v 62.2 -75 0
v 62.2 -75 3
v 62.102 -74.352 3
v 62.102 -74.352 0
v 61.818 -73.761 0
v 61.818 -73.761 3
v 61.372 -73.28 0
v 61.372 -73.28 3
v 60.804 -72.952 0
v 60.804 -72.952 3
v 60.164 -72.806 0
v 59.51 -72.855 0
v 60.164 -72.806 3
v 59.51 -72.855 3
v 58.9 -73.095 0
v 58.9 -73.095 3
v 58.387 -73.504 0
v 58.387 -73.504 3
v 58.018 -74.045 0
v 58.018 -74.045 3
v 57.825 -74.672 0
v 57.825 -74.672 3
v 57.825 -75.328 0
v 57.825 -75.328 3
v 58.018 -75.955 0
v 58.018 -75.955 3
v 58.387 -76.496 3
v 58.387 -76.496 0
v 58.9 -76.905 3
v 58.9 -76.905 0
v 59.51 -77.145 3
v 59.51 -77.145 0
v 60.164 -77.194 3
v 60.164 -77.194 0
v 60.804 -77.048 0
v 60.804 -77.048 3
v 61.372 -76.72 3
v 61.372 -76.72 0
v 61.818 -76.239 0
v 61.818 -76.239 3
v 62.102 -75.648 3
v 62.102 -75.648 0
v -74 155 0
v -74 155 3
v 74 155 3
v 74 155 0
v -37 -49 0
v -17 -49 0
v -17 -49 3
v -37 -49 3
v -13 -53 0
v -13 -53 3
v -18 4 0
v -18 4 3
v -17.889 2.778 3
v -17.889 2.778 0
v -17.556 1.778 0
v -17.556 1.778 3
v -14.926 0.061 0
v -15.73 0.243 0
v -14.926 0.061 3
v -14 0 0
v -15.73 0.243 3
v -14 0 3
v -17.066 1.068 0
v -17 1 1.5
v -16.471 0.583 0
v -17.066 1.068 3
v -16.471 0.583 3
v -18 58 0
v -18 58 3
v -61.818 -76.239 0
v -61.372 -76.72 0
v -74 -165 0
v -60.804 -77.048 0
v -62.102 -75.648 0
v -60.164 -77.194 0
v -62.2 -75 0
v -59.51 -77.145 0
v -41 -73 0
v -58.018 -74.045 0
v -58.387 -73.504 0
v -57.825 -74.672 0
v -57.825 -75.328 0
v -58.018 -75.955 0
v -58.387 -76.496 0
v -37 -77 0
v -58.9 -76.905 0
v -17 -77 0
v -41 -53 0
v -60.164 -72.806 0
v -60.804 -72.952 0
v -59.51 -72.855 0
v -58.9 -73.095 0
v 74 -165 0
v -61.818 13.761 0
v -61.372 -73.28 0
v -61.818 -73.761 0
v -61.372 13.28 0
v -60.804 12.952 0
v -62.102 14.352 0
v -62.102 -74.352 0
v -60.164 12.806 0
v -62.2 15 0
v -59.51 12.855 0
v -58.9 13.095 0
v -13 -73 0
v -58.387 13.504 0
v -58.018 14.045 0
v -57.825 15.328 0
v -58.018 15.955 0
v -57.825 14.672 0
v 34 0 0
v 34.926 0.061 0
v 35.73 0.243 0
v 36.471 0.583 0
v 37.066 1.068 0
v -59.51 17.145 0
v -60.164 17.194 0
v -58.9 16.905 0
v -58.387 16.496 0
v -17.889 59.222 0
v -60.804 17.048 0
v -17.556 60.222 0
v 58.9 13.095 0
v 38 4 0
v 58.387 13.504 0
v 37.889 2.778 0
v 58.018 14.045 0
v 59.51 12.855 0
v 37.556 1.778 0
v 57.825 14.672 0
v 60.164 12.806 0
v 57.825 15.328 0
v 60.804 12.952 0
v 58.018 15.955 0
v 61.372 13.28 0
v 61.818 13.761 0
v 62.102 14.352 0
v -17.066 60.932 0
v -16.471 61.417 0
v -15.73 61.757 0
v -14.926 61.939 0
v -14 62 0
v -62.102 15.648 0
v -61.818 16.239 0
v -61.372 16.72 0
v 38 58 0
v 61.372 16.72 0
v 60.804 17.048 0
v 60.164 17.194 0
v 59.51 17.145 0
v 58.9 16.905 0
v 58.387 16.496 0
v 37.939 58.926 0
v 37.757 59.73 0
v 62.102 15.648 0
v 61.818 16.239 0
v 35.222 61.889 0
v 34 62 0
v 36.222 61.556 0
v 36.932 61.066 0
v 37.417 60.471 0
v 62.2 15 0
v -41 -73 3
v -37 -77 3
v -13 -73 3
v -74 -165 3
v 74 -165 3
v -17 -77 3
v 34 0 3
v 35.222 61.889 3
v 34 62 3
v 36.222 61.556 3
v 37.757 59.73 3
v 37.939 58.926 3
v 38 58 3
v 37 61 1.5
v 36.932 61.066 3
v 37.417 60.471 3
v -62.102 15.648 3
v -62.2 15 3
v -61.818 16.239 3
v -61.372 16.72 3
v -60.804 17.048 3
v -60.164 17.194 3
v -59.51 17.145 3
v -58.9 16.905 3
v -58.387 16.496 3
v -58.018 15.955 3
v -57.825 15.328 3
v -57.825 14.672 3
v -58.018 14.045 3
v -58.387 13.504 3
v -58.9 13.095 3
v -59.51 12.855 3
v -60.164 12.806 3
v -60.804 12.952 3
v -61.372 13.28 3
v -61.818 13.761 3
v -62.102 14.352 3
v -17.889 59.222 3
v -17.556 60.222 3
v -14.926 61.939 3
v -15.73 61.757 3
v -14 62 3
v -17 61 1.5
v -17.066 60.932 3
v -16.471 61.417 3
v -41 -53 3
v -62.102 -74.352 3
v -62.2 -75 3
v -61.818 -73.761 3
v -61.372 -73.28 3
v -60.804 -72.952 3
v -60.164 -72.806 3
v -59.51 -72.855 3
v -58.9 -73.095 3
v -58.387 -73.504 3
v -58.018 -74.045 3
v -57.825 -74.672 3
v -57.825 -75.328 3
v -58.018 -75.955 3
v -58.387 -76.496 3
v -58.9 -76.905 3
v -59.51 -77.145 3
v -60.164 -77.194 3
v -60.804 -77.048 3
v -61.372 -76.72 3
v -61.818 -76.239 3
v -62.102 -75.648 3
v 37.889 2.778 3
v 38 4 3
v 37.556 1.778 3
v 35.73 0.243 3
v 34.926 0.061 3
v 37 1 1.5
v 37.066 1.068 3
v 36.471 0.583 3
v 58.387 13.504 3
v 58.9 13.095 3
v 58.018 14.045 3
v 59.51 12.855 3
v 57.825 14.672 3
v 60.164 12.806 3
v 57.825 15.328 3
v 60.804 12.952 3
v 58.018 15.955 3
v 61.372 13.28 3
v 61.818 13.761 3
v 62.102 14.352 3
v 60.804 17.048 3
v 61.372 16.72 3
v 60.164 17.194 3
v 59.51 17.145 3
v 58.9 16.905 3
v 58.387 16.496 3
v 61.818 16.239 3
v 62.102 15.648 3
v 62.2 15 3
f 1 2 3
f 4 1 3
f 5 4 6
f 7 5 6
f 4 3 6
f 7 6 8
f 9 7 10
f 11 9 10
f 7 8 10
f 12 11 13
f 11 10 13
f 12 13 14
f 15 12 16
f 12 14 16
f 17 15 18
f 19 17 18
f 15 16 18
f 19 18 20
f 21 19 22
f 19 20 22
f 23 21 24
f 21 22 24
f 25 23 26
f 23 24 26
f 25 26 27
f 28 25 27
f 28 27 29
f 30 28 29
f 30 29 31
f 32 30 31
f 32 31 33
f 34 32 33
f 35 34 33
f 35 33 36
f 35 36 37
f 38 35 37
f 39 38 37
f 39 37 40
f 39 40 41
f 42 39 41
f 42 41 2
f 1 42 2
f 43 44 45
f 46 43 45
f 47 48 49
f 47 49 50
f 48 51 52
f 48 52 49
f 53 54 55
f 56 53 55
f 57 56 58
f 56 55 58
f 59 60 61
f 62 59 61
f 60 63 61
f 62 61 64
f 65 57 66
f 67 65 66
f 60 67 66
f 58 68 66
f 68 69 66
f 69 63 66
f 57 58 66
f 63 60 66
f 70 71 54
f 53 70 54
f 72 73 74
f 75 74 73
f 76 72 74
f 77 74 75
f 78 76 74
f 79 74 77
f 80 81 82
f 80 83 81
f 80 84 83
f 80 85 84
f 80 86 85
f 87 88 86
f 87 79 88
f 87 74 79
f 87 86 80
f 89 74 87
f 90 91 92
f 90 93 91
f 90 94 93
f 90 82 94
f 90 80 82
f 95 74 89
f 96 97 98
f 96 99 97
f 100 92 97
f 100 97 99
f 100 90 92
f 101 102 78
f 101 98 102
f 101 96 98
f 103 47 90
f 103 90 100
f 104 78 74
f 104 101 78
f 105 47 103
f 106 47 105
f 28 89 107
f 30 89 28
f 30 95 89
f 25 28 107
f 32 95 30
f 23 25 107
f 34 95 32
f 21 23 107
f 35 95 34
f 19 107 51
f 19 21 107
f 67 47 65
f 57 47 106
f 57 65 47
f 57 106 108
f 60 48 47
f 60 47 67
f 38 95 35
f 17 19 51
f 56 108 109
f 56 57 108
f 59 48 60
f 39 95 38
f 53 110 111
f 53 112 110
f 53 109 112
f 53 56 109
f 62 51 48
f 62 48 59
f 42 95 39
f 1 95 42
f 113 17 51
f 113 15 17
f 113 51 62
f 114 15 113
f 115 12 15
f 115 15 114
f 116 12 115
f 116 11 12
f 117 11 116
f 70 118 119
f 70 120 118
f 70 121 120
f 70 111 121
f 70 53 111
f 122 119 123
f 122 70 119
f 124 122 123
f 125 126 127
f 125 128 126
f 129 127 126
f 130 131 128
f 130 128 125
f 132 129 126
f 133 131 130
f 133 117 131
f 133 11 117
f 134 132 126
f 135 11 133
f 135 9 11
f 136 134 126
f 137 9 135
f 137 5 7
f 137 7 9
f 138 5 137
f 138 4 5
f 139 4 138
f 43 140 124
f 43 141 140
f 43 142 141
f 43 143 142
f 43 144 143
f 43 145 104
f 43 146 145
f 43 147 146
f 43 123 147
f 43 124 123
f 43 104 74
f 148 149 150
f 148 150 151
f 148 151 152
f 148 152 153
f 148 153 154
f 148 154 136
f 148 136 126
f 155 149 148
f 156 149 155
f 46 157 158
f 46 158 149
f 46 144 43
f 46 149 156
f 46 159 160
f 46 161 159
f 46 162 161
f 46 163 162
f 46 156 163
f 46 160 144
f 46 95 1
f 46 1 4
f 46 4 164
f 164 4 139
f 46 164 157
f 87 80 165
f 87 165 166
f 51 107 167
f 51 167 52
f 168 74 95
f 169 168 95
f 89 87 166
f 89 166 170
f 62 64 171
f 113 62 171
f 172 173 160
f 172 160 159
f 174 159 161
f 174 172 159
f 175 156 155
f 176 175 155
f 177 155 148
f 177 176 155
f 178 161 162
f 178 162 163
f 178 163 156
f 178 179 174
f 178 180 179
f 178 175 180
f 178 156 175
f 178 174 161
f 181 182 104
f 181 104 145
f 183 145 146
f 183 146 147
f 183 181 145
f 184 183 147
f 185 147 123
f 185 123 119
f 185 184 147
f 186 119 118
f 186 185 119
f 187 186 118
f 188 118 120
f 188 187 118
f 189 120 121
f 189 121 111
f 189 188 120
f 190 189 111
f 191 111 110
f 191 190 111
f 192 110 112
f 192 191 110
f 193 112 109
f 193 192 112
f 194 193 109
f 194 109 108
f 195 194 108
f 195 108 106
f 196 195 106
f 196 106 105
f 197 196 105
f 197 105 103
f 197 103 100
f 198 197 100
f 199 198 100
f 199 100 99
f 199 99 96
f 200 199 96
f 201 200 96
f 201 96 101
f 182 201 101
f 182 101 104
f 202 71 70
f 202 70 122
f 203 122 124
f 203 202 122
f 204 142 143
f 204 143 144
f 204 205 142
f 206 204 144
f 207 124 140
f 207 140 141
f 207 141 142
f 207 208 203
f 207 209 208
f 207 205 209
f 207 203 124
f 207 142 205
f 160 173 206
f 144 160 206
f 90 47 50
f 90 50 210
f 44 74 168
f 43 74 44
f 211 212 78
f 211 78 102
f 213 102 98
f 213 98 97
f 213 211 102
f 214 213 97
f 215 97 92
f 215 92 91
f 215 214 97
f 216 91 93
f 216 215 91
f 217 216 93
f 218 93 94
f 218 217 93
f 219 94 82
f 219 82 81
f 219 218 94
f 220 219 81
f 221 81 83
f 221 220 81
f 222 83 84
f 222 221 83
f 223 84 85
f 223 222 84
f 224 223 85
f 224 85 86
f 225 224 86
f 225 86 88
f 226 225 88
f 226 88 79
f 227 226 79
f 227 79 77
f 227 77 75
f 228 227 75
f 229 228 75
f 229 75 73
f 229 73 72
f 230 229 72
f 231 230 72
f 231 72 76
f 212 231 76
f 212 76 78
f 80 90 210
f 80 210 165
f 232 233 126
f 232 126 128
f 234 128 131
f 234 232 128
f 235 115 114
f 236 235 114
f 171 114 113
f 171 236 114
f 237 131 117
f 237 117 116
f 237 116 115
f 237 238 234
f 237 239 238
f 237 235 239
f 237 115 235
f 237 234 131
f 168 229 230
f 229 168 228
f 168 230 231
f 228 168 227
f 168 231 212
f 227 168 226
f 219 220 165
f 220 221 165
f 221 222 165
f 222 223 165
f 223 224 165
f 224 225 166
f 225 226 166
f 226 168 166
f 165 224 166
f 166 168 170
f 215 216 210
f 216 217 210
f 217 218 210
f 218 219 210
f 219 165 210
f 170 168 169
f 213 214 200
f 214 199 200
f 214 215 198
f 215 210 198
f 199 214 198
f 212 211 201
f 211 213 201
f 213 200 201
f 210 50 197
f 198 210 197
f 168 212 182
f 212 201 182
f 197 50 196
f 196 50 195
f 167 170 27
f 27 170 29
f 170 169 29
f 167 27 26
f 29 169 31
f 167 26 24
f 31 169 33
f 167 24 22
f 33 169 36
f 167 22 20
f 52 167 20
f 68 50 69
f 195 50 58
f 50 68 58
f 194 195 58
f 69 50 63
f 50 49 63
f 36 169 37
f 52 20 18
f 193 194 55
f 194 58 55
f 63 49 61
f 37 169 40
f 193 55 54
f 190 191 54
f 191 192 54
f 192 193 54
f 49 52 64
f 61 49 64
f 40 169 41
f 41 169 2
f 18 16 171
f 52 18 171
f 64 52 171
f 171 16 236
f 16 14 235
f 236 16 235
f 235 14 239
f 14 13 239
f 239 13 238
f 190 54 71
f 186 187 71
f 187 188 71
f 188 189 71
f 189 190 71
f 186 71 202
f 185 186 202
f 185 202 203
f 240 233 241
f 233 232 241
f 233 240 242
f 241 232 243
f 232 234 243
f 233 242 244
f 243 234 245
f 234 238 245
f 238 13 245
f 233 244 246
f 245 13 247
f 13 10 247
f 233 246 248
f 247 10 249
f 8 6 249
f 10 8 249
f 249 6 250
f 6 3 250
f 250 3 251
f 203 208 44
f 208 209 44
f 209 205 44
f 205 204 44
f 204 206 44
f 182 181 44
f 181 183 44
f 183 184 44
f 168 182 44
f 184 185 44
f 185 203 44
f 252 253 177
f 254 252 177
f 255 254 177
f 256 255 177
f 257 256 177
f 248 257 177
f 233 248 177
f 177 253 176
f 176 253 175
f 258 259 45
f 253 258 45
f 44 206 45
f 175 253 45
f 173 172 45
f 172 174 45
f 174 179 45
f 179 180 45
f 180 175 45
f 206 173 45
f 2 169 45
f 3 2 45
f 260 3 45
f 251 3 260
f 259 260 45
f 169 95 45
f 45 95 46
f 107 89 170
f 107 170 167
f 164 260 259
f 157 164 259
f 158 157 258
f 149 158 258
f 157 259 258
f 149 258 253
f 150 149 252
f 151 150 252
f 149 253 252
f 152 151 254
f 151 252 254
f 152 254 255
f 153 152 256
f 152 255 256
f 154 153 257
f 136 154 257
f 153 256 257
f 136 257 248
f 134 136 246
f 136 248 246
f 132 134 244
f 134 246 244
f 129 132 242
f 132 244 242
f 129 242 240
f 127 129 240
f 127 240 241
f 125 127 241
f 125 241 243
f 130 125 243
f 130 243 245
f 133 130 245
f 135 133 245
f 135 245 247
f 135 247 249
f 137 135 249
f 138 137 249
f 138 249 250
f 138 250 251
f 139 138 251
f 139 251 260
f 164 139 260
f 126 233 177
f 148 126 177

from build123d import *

# Parameters (mm, degrees)
ESQUISSE1_W             = 148
ESQUISSE1_H             = 330
BOSS_EXTRU_1_DEPTH      = 3
ENL_V_MAT_EXTRU_2_REACH = 182.859
ESQUISSE3_R             = 2.2
ENL_V_MAT_EXTRU_3_REACH = 182.859
ESQUISSE4_W             = 148
ESQUISSE4_H             = 10
ENL_V_MAT_EXTRU_4_REACH = 182.859
CONG_1_SIZE             = 4
ENL_V_MAT_EXTRU_5_REACH = 182.859


with BuildPart() as part:
    # Esquisse1 → Boss.-Extru.1 (new body)
    with BuildSketch(Plane.XY):
        Rectangle(ESQUISSE1_W, ESQUISSE1_H)
    extrude(amount=BOSS_EXTRU_1_DEPTH)

    # Esquisse3 → Enlèv. mat.-Extru.2 (cut, up to next)
    with BuildSketch(Plane.XY.offset(3), mode=Mode.PRIVATE) as enl_v_mat_extru_2_sk1:
        with Locations((60, -75)):
            Circle(ESQUISSE3_R)
    enl_v_mat_extru_2_tool1 = extrude(enl_v_mat_extru_2_sk1.sketch, amount=-ENL_V_MAT_EXTRU_2_REACH, mode=Mode.PRIVATE) & part.part
    # Esquisse3 → Enlèv. mat.-Extru.2 (cut, up to next)
    with BuildSketch(Plane.XY.offset(3), mode=Mode.PRIVATE) as enl_v_mat_extru_2_sk2:
        with Locations((60, 15)):
            Circle(ESQUISSE3_R)
    enl_v_mat_extru_2_tool2 = extrude(enl_v_mat_extru_2_sk2.sketch, amount=-ENL_V_MAT_EXTRU_2_REACH, mode=Mode.PRIVATE) & part.part
    enl_v_mat_extru_2_1 = enl_v_mat_extru_2_tool1.solids().sort_by_distance((60, -75, 3))[0]
    add(enl_v_mat_extru_2_1, mode=Mode.SUBTRACT)
    enl_v_mat_extru_2_2 = enl_v_mat_extru_2_tool2.solids().sort_by_distance((60, 15, 3))[0]
    add(enl_v_mat_extru_2_2, mode=Mode.SUBTRACT)
    enl_v_mat_extru_2 = enl_v_mat_extru_2_1 + enl_v_mat_extru_2_2  # Enlèv. mat.-Extru.2 as one shape, for the pattern or mirror that repeats it

    # Esquisse4 → Enlèv. mat.-Extru.3 (cut, up to next)
    with BuildSketch(Plane.XY.offset(3), mode=Mode.PRIVATE) as enl_v_mat_extru_3_sk1:
        with Locations((0, 160)):
            Rectangle(ESQUISSE4_W, ESQUISSE4_H)
    enl_v_mat_extru_3_tool1 = extrude(enl_v_mat_extru_3_sk1.sketch, amount=-ENL_V_MAT_EXTRU_3_REACH, mode=Mode.PRIVATE) & part.part
    add(enl_v_mat_extru_3_tool1.solids().sort_by_distance((0, 160, 3))[0], mode=Mode.SUBTRACT)

    # Esquisse5 → Enlèv. mat.-Extru.4 (cut, up to next)
    with BuildSketch(Plane.XY.offset(3), mode=Mode.PRIVATE) as enl_v_mat_extru_4_sk1:
        Polygon((0, 0), (38, 0), (38, 62), (-18, 62), (-18, 0), align=None)
    enl_v_mat_extru_4_tool1 = extrude(enl_v_mat_extru_4_sk1.sketch, amount=-ENL_V_MAT_EXTRU_4_REACH, mode=Mode.PRIVATE) & part.part
    add(enl_v_mat_extru_4_tool1.solids().sort_by_distance((10, 31, 3))[0], mode=Mode.SUBTRACT)

    # Congé1
    # a fillet whose section is not a circle: 4 mm, written as the material it adds along each edge
    with BuildSketch(Plane(origin=(38, 62, 3), x_dir=(-1, 0, 0), z_dir=(0, 0, -1)), Plane(origin=(-18, 62, 3), x_dir=(0, -1, 0), z_dir=(0, 0, -1)), Plane(origin=(38, 0, 3), x_dir=(0, 1, 0), z_dir=(0, 0, -1))) as cong_1_piece_1:
        with BuildLine():
            Bezier((CONG_1_SIZE, 0), (0, 0), (0, -CONG_1_SIZE), weights=[1, 1, 1])
            Line((0, -CONG_1_SIZE), (0, 0))
            Line((0, 0), (CONG_1_SIZE, 0))
        make_face()
    extrude(amount=3)
    with BuildSketch(Plane(origin=(-18, 0, 3), x_dir=(0, 1, 0), z_dir=(0, 0, -1))) as cong_1_piece_2:
        with BuildLine():
            Bezier((CONG_1_SIZE, 0), (0, 0), (0, CONG_1_SIZE), weights=[1, 1, 1])
            Line((0, CONG_1_SIZE), (0, 0))
            Line((0, 0), (CONG_1_SIZE, 0))
        make_face()
    extrude(amount=3)

    # Esquisse6 → Enlèv. mat.-Extru.5 (cut, up to next)
    with BuildSketch(Plane(origin=(0, 0, 0), x_dir=(-1, 0, 0), z_dir=(0, 0, -1)), mode=Mode.PRIVATE) as enl_v_mat_extru_5_sk1:
        Polygon((17, -49), (37, -49), (41, -53), (41, -73), (37, -77), (17, -77), (13, -73), (13, -53), align=None)
    enl_v_mat_extru_5_tool1 = extrude(enl_v_mat_extru_5_sk1.sketch, amount=-ENL_V_MAT_EXTRU_5_REACH, mode=Mode.PRIVATE) & part.part
    add(enl_v_mat_extru_5_tool1.solids().sort_by_distance((-27, -63, 0))[0], mode=Mode.SUBTRACT)

    # Symétrie1: Enlèv. mat.-Extru.2 across plane
    add(enl_v_mat_extru_2.mirror(Plane(origin=(0, 0, 0), x_dir=(0, 0, 1), z_dir=(1, 0, 0))), mode=Mode.SUBTRACT)


solid = part.part
